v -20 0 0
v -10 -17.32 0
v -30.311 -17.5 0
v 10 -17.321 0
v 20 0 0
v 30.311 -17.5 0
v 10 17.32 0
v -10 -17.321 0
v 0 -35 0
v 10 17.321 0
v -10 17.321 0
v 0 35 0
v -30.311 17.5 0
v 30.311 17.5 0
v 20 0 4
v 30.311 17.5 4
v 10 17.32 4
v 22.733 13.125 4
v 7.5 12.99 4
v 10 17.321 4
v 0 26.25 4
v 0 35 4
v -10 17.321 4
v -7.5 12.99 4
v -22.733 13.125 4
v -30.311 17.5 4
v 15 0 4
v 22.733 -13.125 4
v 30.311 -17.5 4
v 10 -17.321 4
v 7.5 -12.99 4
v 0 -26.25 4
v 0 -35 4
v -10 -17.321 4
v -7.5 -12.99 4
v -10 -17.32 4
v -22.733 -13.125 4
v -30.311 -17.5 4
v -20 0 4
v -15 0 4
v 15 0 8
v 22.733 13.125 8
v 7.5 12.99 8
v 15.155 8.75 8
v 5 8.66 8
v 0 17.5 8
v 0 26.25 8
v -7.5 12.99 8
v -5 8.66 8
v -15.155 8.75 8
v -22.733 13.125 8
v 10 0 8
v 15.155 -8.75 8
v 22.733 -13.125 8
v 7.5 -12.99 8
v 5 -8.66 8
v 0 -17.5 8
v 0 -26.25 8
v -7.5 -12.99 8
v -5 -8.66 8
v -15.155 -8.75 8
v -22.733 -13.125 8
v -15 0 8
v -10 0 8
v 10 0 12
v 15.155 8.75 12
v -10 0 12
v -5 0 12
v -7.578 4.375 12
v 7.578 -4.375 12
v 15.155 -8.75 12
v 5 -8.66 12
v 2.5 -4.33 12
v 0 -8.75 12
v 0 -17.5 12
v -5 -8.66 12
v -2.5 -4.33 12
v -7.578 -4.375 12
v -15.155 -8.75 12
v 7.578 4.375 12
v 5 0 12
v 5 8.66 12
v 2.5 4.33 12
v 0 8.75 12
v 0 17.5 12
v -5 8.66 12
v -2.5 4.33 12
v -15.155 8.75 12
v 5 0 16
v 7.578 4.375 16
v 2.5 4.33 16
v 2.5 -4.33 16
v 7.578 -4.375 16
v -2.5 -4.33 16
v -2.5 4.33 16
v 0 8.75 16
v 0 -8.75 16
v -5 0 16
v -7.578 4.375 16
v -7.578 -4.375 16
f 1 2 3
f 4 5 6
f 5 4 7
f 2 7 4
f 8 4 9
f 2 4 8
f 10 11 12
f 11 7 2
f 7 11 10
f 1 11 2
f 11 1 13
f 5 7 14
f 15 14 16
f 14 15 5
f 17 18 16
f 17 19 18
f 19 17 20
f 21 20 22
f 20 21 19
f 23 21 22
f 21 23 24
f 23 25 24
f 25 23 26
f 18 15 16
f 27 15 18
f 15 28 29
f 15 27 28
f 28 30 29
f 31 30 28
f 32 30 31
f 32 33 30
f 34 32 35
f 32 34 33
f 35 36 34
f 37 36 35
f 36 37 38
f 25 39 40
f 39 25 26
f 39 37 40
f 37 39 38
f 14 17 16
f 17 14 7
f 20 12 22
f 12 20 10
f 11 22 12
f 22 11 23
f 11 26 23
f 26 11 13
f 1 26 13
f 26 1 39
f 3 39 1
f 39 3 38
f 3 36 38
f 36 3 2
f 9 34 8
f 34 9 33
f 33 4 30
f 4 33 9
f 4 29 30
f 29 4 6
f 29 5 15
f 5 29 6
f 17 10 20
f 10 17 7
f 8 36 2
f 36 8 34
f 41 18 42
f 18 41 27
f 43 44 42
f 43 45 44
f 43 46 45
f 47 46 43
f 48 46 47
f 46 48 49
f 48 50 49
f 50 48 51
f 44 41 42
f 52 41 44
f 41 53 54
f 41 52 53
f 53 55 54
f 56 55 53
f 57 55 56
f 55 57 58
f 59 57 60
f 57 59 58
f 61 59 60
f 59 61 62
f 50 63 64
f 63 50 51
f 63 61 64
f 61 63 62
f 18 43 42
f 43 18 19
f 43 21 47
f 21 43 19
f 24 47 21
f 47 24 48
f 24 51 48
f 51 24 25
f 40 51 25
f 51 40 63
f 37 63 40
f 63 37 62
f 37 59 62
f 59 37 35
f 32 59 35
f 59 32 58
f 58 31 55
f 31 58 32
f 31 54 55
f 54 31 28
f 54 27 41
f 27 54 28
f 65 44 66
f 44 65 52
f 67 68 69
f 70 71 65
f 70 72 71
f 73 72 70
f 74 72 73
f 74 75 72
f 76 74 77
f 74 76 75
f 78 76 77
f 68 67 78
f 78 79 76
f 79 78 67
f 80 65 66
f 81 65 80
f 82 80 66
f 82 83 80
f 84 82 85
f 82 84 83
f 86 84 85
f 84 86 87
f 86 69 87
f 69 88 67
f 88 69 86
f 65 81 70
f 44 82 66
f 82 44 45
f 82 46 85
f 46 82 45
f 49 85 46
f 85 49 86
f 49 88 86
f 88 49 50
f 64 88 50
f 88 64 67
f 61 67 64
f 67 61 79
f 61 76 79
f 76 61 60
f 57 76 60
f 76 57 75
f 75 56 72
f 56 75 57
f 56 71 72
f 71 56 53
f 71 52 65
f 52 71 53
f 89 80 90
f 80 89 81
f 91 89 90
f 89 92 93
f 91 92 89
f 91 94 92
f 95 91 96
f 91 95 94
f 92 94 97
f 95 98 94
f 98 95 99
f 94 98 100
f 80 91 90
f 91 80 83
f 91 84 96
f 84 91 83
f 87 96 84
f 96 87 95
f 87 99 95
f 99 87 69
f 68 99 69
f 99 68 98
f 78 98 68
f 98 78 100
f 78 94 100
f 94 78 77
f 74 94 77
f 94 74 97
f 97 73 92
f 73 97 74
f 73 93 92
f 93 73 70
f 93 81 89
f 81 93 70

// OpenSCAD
module gear(height, radius, teeth_depth, teeth=30) {
	cylinder(h=height, r=radius, $fn=teeth);
	for(tooth = [0:teeth]) {
		rotate([0, 0, tooth * 360 / teeth]) {
			linear_extrude(height=height) {
				polygon(points=[[radius, 0],[cos(360 / teeth) * radius, sin(360 / teeth) * radius], [cos(180 / teeth) * (radius + teeth_depth), sin(180 / teeth) * (radius + teeth_depth)]], convexity=1);
			}
		}
	}
}

gear(height=4, radius=20, teeth_depth=15, teeth=6);
gear(height=8, radius=20*0.75, teeth_depth=15*0.75, teeth=6);
gear(height=12, radius=20*0.5, teeth_depth=15*0.5, teeth=6);
gear(height=16, radius=20*0.25, teeth_depth=15*0.25, teeth=6);
